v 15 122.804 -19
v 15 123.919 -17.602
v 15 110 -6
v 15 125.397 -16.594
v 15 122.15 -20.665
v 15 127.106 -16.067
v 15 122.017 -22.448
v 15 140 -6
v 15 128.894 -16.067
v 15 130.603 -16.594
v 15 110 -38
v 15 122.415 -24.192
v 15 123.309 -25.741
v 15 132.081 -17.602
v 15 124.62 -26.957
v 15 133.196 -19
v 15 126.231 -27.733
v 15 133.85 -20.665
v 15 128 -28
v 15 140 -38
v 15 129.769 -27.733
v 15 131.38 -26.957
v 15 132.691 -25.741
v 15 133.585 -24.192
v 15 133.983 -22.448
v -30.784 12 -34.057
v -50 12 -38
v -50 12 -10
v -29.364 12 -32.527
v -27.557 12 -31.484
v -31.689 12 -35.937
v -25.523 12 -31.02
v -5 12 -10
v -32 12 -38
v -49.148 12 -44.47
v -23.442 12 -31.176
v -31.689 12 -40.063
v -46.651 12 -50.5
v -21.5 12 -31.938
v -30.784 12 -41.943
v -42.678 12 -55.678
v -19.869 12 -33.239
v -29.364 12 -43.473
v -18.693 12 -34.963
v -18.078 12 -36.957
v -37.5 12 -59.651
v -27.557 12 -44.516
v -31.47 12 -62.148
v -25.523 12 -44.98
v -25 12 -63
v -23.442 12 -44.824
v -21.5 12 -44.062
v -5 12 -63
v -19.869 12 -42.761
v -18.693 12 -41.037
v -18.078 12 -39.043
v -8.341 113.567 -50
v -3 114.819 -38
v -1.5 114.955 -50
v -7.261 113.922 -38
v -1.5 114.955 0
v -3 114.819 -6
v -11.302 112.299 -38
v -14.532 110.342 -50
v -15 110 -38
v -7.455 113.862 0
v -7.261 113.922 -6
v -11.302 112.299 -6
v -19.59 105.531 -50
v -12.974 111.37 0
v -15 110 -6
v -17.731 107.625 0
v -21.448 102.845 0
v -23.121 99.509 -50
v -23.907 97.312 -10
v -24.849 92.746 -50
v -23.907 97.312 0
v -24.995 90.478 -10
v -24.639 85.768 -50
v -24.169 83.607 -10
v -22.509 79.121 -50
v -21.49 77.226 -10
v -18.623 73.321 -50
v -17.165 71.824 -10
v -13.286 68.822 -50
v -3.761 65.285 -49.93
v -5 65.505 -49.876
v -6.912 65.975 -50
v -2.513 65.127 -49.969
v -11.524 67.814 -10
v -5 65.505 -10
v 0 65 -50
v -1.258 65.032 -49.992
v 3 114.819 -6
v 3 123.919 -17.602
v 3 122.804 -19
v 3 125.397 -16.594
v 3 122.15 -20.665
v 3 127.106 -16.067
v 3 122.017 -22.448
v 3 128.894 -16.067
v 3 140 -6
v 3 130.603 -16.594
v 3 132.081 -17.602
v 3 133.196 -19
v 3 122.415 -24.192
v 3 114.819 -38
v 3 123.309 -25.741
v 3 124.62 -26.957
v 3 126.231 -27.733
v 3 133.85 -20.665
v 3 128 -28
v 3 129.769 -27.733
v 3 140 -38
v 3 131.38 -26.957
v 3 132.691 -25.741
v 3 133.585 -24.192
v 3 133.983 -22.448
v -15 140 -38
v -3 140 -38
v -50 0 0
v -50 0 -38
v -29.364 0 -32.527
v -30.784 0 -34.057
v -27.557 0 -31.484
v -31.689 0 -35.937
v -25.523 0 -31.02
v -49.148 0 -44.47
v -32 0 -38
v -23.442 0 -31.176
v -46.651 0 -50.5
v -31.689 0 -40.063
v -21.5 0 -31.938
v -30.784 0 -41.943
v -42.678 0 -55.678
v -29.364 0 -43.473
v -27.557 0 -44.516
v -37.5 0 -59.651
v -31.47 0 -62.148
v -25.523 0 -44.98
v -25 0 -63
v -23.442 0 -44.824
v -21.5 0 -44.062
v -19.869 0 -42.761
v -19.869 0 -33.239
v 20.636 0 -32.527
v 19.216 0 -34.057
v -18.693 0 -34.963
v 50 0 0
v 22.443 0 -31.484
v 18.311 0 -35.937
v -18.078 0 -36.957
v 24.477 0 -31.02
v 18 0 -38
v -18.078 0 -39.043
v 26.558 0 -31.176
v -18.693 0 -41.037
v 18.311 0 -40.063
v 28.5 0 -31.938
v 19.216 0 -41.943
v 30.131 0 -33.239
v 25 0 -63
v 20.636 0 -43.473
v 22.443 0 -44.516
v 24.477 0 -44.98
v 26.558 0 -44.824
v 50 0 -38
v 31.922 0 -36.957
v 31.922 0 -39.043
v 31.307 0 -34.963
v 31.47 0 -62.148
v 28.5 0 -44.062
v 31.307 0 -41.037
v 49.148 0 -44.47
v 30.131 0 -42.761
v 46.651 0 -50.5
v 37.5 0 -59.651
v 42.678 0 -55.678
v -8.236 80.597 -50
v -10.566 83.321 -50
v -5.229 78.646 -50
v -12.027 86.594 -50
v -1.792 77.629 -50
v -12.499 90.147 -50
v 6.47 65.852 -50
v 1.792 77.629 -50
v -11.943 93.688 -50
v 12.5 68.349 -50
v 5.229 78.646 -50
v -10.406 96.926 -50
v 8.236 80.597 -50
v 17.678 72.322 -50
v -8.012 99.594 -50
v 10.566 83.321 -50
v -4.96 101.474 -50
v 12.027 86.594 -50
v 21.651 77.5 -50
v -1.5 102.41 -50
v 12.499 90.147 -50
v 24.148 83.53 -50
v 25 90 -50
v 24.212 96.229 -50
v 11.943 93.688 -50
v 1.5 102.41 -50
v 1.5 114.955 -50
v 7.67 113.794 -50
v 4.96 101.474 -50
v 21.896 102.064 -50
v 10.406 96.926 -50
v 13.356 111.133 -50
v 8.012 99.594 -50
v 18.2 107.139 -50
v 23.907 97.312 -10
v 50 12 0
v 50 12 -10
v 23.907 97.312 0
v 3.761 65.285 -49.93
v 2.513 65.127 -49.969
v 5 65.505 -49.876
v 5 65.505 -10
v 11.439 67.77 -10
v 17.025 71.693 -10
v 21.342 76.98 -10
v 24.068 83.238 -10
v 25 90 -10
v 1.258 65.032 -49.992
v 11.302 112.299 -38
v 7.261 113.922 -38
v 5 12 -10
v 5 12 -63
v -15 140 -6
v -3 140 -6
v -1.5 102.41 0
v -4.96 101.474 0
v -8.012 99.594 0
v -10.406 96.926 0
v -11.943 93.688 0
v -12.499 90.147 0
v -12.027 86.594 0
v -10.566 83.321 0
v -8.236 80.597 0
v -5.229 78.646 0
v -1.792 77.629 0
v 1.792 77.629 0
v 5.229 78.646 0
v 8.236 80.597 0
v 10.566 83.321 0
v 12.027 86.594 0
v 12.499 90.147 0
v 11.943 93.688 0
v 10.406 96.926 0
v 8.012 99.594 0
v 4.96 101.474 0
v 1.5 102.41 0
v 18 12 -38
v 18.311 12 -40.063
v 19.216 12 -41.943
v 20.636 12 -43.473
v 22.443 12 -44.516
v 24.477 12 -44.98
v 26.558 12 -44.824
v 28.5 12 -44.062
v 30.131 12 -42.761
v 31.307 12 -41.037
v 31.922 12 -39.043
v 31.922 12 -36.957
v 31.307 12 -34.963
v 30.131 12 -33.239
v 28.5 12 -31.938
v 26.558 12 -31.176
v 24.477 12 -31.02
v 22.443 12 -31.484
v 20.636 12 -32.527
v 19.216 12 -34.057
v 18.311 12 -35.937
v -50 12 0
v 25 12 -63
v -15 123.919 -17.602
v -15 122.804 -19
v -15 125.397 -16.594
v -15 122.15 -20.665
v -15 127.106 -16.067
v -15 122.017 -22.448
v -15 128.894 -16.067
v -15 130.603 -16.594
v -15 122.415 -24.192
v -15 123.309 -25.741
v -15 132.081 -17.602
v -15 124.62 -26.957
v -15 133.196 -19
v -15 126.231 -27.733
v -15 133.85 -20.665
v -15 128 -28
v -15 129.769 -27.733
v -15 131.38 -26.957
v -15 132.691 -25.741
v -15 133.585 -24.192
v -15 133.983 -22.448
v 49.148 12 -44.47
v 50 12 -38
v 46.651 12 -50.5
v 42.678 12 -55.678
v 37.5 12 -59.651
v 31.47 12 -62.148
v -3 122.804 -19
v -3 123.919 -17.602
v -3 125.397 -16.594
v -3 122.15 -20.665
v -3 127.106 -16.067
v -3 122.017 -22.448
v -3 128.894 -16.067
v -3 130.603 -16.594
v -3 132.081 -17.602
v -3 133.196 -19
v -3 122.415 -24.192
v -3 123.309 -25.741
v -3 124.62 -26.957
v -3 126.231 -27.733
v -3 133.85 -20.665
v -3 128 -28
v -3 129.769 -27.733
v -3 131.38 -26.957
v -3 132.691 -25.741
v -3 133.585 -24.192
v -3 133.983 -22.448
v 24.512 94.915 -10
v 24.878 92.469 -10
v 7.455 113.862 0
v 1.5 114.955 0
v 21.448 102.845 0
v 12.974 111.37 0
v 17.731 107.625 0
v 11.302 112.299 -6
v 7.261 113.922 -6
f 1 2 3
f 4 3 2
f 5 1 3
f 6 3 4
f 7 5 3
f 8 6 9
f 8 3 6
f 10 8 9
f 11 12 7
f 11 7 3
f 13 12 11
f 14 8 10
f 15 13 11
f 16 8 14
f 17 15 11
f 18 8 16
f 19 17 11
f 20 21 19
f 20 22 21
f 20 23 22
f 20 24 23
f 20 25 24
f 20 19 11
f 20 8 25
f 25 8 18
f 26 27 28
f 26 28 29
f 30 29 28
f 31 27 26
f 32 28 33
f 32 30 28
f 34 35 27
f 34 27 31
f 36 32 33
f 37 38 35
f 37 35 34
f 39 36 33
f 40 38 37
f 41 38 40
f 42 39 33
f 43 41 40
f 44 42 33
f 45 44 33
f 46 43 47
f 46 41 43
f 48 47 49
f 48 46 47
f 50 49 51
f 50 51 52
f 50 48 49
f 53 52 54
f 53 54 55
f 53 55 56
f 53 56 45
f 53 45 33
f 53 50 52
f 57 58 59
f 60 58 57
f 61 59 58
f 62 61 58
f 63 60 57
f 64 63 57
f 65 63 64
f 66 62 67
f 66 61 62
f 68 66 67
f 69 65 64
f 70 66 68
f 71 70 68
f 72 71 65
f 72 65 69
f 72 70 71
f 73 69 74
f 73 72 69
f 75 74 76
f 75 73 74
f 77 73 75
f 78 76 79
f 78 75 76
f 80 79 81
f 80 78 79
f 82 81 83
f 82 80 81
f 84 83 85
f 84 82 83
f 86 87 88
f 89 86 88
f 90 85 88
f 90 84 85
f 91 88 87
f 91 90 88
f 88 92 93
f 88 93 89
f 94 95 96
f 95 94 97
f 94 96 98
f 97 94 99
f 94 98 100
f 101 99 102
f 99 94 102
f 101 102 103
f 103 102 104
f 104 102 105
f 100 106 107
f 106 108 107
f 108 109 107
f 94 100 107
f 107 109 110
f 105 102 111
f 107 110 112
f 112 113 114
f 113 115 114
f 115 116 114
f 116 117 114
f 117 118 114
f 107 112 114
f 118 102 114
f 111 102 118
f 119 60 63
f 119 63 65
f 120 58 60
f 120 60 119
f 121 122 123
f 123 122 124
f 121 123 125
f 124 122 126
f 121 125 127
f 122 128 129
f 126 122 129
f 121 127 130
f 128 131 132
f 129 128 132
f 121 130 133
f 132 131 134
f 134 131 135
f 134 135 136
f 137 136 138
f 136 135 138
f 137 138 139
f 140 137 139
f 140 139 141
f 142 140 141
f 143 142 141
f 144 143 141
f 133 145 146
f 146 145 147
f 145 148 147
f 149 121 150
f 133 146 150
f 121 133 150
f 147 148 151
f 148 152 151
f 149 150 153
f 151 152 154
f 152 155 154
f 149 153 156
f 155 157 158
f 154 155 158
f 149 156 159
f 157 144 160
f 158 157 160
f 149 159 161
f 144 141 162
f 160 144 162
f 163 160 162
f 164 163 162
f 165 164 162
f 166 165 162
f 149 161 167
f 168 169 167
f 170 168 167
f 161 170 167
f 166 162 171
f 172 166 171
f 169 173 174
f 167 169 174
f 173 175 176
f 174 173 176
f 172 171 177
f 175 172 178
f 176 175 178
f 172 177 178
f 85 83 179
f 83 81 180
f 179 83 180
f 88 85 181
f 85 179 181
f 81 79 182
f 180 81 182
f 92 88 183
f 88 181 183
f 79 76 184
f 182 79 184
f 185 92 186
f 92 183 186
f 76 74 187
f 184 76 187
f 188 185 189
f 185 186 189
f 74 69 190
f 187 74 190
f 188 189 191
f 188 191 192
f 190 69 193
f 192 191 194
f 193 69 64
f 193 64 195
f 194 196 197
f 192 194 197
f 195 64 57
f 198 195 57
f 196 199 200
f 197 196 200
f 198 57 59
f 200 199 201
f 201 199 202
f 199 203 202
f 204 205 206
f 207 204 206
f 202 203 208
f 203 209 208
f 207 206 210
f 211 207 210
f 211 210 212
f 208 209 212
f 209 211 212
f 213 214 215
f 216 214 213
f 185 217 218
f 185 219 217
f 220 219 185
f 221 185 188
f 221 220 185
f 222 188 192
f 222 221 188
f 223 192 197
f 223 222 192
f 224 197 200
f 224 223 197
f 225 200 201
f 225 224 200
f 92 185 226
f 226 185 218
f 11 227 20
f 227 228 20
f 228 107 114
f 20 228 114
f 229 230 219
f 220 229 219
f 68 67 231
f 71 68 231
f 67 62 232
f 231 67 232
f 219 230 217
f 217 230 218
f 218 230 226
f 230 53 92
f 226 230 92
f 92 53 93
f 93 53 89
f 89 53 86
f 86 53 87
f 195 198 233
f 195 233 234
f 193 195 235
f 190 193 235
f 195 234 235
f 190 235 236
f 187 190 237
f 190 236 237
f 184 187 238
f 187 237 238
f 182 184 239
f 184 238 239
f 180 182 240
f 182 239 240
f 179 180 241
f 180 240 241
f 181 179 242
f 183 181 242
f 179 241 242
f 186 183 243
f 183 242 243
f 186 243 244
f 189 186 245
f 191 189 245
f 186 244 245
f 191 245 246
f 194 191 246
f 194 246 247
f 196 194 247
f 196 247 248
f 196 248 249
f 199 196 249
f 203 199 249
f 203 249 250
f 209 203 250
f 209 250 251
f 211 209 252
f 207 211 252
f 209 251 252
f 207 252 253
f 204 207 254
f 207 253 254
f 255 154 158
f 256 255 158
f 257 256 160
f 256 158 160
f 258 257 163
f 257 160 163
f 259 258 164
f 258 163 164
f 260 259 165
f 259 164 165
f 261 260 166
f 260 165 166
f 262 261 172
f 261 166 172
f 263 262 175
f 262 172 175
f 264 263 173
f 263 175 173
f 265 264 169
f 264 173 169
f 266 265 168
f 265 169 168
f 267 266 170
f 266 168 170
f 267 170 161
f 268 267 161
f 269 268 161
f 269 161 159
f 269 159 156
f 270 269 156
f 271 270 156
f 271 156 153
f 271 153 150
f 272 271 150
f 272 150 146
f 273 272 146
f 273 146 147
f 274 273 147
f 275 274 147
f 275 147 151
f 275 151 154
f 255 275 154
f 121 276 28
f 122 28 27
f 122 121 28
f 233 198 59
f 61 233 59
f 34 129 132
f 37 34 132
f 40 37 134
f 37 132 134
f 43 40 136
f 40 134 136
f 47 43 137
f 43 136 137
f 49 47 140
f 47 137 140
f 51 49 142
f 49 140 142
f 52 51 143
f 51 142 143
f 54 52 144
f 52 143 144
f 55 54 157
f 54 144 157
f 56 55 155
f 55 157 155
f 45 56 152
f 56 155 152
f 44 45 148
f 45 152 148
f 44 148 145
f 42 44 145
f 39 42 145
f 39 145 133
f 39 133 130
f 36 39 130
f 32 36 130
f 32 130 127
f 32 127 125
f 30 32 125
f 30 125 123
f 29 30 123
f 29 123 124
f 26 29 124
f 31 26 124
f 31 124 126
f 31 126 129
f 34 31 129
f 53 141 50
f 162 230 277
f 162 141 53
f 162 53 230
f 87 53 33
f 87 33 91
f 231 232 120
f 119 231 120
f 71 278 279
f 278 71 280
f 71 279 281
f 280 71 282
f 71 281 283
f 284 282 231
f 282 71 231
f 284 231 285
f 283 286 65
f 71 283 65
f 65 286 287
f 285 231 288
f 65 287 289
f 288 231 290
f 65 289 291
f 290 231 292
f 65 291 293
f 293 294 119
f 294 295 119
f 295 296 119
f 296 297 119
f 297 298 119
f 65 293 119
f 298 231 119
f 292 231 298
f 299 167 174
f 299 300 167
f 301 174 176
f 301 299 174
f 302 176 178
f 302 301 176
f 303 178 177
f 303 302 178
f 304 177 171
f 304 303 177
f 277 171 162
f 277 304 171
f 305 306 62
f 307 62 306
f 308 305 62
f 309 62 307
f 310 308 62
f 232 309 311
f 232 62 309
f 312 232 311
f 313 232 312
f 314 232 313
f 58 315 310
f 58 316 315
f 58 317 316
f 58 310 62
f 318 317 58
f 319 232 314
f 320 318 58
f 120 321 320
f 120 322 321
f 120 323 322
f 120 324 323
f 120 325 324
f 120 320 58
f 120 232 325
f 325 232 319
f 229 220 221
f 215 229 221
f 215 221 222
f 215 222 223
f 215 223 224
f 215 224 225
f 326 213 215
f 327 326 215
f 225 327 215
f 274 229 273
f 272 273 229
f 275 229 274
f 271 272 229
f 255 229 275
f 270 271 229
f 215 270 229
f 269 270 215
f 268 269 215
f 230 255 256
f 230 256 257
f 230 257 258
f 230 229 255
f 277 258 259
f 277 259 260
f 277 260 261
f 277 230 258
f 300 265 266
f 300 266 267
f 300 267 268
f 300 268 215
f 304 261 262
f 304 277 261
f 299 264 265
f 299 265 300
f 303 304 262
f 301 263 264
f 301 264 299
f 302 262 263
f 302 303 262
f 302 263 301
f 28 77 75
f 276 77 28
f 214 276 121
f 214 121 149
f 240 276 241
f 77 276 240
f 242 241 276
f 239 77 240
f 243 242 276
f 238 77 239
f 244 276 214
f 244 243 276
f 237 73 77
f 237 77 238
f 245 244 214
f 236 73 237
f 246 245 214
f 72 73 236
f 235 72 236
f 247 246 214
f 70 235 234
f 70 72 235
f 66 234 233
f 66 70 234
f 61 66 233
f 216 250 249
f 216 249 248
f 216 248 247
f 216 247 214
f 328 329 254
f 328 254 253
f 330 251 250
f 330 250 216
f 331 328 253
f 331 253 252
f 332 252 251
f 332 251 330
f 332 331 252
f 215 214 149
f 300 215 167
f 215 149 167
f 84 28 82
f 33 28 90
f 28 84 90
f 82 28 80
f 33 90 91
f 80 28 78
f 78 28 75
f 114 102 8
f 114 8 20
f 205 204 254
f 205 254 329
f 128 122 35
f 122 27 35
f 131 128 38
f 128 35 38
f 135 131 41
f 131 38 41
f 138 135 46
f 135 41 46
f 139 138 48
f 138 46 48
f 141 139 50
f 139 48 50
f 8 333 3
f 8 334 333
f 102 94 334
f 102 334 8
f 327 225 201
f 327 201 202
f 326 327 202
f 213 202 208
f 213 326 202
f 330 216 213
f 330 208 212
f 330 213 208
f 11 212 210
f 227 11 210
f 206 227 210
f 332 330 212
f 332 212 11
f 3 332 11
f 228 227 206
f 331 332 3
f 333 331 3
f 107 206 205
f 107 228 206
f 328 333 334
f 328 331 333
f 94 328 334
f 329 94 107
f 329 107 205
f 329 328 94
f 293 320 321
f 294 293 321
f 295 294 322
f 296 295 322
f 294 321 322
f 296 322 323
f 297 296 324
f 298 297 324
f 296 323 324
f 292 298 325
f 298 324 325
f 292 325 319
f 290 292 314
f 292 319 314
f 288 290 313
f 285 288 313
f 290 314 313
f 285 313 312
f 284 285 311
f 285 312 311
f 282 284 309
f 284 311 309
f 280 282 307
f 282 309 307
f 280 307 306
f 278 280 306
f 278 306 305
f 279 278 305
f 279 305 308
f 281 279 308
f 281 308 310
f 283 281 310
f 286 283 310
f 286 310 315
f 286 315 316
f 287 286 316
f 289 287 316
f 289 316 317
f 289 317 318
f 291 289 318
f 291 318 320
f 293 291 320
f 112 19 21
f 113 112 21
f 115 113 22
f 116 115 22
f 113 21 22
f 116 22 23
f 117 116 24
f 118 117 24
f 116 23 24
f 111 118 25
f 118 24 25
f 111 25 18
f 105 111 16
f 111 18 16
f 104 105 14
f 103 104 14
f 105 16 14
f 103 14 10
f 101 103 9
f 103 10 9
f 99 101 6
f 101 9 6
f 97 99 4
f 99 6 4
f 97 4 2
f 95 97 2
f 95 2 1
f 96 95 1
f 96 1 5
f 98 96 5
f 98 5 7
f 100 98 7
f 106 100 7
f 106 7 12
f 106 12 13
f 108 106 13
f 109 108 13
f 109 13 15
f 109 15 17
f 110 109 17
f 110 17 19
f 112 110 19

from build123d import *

# Parameters (mm, degrees)
SKETCH1_W           = 100
SKETCH1_H           = 63
BOSS_EXTRUDE1_DEPTH = 12
SKETCH2_R           = 25
BOSS_EXTRUDE2_DEPTH = 50
BOSS_EXTRUDE3_DEPTH = 10
RIB1_REACH          = 142.335
SKETCH4_WALL_W      = 337.241680066
SKETCH4_WALL_H      = 10
BOSS_EXTRUDE4_START = 3
SKETCH5_W           = 32
SKETCH5_H           = 32
BOSS_EXTRUDE4_DEPTH = 12
BOSS_EXTRUDE5_START = 3
SKETCH5_2_W         = 32
SKETCH5_2_H         = 32
BOSS_EXTRUDE5_DEPTH = 12
SKETCH6_W           = 3
SKETCH6_H           = 46.09785454
CUT_EXTRUDE1_DEPTH  = 157.843871414
HOLE1_D             = 25
HOLE2_D             = 12
HOLE3_D             = 14
HOLE3_DEPTH         = 12
FILLET1_R           = 25


with BuildPart() as part:
    # Sketch1 → Boss-Extrude1 (new body)
    with BuildSketch(Plane(origin=(0, 0, 0), x_dir=(1, 0, 0), z_dir=(0, 1, 0))):
        with Locations((0, 31.5)):
            Rectangle(SKETCH1_W, SKETCH1_H)
    extrude(amount=BOSS_EXTRUDE1_DEPTH)



with BuildPart() as body_2:
    # Sketch2 → Boss-Extrude2 (new body)
    with BuildSketch(Plane.XY):
        with Locations((0, 90)):
            Circle(SKETCH2_R)
    extrude(amount=-BOSS_EXTRUDE2_DEPTH)


with BuildPart() as part_1:
    add(part.part)

    add(body_2.part)  # Boss-Extrude3 merges body 2
    # Sketch3 → Boss-Extrude3 (add)
    with BuildSketch(Plane.XY):
        with BuildLine():
            Line((-50, 12), (50, 12))
            Line((50, 12), (23.906779363, 97.312038053))
            ThreePointArc((23.906779363, 97.312038053), (0, 115), (-23.906779363, 97.312038053))
            Line((-23.906779363, 97.312038053), (-50, 12))
        make_face()
    extrude(amount=-BOSS_EXTRUDE3_DEPTH)

    # Sketch4 wall → Rib1 (add, up to next)
    with BuildSketch(Plane(origin=(0, 38.5, -56.5), x_dir=(0, 0.971210844098, 0.238221527798), z_dir=(0, -0.238221527798, 0.971210844098)), mode=Mode.PRIVATE) as rib1_sk1:
        Rectangle(SKETCH4_WALL_W, SKETCH4_WALL_H)
    rib1_tool1 = extrude(rib1_sk1.sketch, amount=RIB1_REACH, mode=Mode.PRIVATE) - part_1.part
    add(rib1_tool1.solids().sort_by_distance((0, 38.5, -56.5))[0])



with BuildPart() as body_2_2:
    # Sketch5 → Boss-Extrude4 (new body)
    with BuildSketch(Plane(origin=(0, 0, 0), x_dir=(0, 0, -1), z_dir=(1, 0, 0)).offset(BOSS_EXTRUDE4_START)):
        with Locations((22, 124)):
            Rectangle(SKETCH5_W, SKETCH5_H)
    extrude(amount=BOSS_EXTRUDE4_DEPTH)


with BuildPart() as part_2:
    add(part_1.part)

    add(body_2_2.part)  # Boss-Extrude5 merges body 2 2
    # Sketch5<2> → Boss-Extrude5 (add)
    with BuildSketch(Plane(origin=(0, 0, 0), x_dir=(0, 0, -1), z_dir=(1, 0, 0)).offset(BOSS_EXTRUDE5_START)):
        with Locations((22, 124)):
            Rectangle(SKETCH5_2_W, SKETCH5_2_H)
    boss_extrude5 = extrude(amount=BOSS_EXTRUDE5_DEPTH)

    # Mirror7: Boss-Extrude5 across plane
    add(boss_extrude5.mirror(Plane(origin=(0, 0, 0), x_dir=(0, 0, 1), z_dir=(1, 0, 0))))

    # Sketch6 → Cut-Extrude1 (cut, through all)
    with BuildSketch(Plane(origin=(0, 0, -50), x_dir=(-1, 0, 0), z_dir=(0, 0, -1))):
        with Locations((0, 116.95107273)):
            Rectangle(SKETCH6_W, SKETCH6_H)
    extrude(amount=-CUT_EXTRUDE1_DEPTH, mode=Mode.SUBTRACT)

    # Hole1 (through all)
    with Locations(Plane(origin=(0, 0, -50), x_dir=(-1, 0, 0), z_dir=(0, 0, -1))):
        with Locations((0, 90)):
            Hole(HOLE1_D / 2)

    # Hole2 (through all)
    with Locations(Plane.ZY.offset(15)):
        with Locations((-22, 128)):
            Hole(HOLE2_D / 2)

    # Hole3
    with Locations(Plane(origin=(0, 12, 0), x_dir=(1, 0, 0), z_dir=(0, 1, 0))):
        with Locations((-25, 38), (25, 38)):
            Hole(HOLE3_D / 2, depth=HOLE3_DEPTH)

    # Fillet1
    fillet1_edges = [part_2.edges().sort_by_distance(p)[0] for p in [
        (-50, 6, -63),
        (50, 6, -63),
    ]]
    fillet(fillet1_edges, radius=FILLET1_R)


solid = part_2.part
